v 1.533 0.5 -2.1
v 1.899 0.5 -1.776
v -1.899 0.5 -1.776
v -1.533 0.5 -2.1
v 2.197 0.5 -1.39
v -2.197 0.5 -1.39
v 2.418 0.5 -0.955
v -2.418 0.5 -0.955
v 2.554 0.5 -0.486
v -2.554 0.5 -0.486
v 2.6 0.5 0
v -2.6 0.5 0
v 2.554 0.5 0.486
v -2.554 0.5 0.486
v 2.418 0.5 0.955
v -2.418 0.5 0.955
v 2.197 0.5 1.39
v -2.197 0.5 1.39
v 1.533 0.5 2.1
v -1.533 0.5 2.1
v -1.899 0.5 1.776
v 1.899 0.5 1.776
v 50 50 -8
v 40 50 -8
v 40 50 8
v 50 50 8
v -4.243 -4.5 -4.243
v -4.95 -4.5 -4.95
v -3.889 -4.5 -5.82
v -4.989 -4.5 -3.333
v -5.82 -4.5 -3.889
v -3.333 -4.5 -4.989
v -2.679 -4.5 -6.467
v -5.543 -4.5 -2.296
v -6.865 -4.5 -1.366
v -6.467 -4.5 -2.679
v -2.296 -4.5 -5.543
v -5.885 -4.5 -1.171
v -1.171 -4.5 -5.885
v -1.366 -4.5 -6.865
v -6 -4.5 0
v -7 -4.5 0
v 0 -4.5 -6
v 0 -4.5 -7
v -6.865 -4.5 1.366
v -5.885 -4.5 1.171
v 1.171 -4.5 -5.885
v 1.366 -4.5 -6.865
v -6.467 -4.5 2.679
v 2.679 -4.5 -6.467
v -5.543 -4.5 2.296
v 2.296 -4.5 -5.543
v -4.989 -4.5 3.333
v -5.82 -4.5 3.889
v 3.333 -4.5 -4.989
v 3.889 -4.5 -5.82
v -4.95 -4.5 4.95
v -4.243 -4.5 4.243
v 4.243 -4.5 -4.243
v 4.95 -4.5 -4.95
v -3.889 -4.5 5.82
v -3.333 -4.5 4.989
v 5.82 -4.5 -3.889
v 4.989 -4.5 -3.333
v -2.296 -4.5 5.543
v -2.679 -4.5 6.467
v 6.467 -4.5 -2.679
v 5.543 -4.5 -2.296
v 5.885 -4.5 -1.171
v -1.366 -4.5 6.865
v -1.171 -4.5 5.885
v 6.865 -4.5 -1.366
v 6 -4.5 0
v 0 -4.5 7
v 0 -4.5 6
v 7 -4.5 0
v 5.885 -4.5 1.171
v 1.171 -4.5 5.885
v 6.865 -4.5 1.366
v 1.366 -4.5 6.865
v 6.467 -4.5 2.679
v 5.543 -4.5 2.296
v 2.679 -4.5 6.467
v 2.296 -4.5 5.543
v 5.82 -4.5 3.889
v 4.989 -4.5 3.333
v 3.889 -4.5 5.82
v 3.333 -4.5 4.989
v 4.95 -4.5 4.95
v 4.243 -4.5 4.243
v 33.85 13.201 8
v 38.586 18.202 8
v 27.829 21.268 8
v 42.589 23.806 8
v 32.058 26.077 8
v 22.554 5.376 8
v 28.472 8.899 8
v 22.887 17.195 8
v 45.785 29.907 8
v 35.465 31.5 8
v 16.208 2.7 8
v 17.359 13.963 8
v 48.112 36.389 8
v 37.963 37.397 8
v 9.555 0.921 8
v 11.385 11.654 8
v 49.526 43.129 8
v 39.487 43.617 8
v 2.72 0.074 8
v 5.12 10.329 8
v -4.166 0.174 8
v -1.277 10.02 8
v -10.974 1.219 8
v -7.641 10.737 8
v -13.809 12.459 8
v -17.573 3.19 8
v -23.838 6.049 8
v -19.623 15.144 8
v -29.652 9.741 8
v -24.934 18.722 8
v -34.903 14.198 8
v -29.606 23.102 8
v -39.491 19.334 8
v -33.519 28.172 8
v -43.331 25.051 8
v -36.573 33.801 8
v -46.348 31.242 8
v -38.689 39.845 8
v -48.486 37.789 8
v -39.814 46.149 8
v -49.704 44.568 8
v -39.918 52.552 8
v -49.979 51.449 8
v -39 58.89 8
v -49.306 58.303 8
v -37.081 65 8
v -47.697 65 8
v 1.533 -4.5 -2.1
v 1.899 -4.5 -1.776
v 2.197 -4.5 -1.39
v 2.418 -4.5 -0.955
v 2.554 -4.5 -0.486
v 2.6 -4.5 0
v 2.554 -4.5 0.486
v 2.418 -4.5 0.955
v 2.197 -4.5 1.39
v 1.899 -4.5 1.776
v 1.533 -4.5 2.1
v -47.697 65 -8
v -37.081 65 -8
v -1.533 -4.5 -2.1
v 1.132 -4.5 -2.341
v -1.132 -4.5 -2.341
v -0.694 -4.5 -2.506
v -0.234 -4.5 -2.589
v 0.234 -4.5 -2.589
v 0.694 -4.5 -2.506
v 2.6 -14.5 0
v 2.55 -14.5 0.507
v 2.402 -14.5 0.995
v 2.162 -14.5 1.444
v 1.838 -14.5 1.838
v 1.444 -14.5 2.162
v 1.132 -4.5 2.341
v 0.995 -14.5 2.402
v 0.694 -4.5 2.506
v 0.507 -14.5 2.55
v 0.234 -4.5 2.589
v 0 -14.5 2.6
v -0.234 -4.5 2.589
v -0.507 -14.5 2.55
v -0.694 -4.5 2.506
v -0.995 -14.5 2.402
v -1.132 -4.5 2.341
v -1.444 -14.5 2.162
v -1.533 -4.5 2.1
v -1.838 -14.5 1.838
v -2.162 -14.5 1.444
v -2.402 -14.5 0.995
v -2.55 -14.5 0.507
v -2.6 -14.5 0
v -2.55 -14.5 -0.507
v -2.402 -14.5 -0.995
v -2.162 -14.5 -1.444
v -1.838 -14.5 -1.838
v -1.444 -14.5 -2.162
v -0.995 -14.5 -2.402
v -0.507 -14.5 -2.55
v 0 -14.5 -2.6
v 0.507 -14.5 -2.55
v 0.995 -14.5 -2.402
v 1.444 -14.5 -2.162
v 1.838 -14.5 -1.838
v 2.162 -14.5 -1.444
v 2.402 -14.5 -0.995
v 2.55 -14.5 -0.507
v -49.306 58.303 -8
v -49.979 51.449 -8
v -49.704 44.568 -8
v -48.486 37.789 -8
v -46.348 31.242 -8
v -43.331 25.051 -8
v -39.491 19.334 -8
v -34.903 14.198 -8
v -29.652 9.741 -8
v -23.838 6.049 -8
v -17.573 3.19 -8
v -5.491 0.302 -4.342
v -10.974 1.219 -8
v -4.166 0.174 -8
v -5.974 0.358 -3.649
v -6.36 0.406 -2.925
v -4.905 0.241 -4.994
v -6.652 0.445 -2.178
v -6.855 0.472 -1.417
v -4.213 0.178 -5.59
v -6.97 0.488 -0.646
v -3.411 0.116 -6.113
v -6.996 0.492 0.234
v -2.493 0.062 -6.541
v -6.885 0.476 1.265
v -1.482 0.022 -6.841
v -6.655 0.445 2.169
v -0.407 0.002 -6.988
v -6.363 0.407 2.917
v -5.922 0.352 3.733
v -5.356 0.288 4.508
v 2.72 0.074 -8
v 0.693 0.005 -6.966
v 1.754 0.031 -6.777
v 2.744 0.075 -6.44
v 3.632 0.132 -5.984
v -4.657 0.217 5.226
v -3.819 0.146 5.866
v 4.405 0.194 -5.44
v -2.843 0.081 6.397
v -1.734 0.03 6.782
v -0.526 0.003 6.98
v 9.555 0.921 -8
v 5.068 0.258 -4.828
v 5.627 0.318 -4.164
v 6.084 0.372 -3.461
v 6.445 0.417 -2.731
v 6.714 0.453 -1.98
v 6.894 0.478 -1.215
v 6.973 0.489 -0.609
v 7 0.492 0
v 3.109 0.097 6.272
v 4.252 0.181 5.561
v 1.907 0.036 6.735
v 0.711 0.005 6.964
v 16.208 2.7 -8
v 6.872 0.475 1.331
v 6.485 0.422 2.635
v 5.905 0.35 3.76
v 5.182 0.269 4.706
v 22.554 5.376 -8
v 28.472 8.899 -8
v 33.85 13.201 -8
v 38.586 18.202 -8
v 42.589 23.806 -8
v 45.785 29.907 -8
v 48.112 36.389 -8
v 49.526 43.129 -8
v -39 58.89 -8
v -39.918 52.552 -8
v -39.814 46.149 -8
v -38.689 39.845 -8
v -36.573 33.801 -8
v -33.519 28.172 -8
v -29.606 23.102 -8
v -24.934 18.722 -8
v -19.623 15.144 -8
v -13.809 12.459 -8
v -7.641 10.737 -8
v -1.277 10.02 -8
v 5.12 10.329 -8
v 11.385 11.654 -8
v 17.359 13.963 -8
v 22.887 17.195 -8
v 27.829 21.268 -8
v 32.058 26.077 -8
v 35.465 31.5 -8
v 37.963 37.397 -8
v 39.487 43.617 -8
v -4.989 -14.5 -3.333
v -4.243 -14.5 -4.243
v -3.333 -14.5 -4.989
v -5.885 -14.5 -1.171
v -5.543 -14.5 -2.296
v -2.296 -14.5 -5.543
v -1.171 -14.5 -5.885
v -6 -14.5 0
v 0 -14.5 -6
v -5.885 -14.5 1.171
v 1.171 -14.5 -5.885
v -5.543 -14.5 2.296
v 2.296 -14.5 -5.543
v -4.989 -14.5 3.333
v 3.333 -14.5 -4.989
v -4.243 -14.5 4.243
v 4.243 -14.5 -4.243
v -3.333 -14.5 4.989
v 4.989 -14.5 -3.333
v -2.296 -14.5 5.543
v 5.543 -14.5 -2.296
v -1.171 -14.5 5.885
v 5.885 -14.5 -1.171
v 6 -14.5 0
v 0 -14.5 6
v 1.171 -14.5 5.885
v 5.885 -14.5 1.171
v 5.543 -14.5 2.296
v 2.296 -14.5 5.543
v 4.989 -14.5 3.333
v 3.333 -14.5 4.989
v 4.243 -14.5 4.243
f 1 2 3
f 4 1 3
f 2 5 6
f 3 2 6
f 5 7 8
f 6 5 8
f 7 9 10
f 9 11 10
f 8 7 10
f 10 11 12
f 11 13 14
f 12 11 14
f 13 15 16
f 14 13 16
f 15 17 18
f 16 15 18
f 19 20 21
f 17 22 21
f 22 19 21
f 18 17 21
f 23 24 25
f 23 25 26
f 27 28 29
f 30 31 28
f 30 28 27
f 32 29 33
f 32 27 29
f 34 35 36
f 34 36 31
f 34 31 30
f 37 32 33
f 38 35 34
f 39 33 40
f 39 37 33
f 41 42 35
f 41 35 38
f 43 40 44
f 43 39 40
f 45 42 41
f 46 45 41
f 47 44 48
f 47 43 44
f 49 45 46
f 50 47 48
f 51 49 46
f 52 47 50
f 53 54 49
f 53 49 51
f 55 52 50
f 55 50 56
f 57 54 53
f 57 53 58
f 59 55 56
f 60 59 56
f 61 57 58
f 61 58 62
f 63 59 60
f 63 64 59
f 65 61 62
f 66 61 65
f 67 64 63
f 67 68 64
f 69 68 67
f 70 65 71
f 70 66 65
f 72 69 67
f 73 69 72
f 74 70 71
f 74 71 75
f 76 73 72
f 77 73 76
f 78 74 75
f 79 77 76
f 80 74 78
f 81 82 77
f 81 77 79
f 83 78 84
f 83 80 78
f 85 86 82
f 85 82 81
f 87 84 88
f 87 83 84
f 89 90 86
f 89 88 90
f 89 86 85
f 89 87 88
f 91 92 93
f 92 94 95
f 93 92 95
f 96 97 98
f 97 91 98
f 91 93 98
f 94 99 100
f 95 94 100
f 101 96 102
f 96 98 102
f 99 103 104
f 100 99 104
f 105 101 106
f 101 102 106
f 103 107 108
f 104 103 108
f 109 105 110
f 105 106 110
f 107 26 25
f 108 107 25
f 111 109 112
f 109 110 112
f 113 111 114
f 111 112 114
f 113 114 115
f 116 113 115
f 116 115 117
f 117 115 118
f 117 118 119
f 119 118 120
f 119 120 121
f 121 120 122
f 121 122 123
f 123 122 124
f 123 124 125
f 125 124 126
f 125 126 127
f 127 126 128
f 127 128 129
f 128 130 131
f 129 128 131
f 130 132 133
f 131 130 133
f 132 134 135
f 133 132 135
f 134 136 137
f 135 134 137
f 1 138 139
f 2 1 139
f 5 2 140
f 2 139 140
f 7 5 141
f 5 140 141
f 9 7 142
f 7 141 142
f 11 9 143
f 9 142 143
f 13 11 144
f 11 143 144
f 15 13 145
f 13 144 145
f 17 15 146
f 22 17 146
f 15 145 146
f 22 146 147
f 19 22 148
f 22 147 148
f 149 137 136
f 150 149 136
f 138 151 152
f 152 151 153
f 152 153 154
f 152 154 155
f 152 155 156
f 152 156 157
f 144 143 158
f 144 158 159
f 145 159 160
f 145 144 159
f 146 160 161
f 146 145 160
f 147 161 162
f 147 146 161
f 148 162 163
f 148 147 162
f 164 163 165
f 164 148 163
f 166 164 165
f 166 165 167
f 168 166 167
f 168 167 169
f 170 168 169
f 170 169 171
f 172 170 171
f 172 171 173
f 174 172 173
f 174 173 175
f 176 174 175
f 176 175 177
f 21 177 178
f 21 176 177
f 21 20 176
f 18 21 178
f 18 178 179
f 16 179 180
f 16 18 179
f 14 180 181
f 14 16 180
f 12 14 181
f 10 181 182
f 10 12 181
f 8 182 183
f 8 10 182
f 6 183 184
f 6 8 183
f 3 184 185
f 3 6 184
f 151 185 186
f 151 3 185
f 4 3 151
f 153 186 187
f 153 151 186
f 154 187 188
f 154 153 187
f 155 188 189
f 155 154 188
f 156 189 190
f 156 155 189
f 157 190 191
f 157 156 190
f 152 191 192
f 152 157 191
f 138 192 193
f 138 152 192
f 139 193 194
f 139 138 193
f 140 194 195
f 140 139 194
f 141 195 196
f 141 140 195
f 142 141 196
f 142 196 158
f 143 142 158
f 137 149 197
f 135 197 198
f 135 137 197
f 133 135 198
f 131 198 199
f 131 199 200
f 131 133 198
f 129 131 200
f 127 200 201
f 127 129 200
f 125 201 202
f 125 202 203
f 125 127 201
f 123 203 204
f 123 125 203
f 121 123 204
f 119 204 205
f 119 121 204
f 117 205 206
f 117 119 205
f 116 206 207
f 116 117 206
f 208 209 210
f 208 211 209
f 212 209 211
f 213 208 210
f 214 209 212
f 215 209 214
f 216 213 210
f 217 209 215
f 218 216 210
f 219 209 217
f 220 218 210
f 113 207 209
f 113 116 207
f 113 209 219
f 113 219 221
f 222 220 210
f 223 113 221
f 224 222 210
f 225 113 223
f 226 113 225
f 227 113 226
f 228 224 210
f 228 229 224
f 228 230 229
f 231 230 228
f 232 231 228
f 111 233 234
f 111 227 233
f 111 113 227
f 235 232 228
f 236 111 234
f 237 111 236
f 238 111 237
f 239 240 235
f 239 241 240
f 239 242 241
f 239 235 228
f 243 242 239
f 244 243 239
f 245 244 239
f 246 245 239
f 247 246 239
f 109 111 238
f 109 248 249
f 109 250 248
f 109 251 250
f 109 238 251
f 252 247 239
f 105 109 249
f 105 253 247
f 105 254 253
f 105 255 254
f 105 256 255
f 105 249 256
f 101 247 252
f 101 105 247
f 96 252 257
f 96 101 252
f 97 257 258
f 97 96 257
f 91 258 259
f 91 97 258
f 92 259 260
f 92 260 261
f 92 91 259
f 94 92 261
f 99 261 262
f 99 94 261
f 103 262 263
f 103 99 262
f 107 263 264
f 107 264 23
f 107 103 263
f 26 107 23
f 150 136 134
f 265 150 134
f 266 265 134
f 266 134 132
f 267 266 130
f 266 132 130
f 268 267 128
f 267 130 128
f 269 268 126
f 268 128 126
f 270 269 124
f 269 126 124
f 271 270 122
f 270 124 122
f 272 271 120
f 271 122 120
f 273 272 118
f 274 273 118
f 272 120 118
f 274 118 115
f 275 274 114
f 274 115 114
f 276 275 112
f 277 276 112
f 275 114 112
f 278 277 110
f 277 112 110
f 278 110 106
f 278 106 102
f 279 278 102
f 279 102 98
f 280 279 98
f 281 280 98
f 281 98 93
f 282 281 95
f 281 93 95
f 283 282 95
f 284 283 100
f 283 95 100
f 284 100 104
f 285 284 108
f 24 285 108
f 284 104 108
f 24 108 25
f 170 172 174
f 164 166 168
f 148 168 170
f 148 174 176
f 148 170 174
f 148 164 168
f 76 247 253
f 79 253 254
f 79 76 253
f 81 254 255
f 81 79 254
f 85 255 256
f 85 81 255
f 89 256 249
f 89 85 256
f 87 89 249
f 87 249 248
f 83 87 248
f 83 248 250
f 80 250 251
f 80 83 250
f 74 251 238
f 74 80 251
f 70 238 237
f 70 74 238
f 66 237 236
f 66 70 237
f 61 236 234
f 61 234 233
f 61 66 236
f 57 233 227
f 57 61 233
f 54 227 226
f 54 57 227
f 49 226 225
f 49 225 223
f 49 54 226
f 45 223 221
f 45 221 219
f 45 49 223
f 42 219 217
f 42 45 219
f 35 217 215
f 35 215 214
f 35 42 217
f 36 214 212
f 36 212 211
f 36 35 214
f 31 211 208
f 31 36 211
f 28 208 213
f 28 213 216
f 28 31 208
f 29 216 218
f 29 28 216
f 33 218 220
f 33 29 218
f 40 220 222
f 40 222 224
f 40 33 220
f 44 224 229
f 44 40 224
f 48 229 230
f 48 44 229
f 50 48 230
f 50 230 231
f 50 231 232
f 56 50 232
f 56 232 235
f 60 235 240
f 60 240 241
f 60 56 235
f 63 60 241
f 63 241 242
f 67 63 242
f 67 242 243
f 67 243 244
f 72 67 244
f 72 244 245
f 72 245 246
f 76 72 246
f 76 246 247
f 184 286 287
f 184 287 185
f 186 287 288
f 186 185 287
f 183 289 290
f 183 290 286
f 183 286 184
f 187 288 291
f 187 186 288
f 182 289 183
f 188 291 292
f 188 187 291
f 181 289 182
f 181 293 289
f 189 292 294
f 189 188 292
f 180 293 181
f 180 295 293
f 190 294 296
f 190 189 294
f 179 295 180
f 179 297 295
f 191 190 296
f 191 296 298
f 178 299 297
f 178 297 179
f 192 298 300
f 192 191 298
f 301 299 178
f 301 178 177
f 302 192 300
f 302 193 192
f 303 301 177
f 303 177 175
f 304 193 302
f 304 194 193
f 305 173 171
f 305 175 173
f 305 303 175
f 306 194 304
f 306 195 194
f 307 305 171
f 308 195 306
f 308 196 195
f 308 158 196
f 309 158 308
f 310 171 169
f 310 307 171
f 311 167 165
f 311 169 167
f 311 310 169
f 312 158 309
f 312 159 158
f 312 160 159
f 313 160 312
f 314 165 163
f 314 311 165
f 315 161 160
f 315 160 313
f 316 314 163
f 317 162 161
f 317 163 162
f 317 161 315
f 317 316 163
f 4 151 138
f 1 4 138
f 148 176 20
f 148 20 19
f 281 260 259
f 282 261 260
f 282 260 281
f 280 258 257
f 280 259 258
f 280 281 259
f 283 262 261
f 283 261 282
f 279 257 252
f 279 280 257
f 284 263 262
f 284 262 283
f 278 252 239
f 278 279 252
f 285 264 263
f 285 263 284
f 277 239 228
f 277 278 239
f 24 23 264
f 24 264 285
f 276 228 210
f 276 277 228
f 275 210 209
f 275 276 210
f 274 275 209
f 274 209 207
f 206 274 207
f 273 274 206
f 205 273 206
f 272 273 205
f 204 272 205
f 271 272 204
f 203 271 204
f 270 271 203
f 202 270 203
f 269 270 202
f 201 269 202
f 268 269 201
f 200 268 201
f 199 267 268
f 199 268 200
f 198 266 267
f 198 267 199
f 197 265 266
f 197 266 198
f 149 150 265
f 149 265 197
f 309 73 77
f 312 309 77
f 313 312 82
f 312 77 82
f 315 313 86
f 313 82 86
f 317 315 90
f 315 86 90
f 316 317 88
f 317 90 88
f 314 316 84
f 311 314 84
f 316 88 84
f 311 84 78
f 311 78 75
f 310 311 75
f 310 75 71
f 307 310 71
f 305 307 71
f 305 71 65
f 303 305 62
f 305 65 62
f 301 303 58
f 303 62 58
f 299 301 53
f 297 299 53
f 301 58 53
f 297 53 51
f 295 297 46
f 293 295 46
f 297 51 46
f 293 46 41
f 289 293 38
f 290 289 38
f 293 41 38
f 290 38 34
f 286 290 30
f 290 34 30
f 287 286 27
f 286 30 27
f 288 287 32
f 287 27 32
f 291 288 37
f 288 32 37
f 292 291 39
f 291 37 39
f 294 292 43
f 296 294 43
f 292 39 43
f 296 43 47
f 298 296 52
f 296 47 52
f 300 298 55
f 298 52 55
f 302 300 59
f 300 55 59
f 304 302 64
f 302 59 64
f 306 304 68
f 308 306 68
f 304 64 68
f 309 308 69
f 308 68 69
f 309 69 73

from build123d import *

# Parameters (mm, degrees)
PAD_DEPTH     = 8
SKETCH002_R   = 7
PAD001_DEPTH  = 4.5
POCKET_DEPTH  = 5
SKETCH005_R   = 6
SKETCH005_R_2 = 2.6
PAD002_DEPTH  = 10


with BuildPart() as part:
    # Sketch001 → Pad (new body, symmetric)
    with BuildSketch(Plane.XY):
        with BuildLine():
            ThreePointArc((-37.080992, 65), (-7.64069, 10.736533), (40, 50))
            Line((40, 50), (50, 50))
            ThreePointArc((-47.69696, 65), (-7.587885, 0.579114), (50, 50))
            Line((-47.69696, 65), (-37.080992, 65))
        make_face()
    extrude(amount=PAD_DEPTH, both=True)

    # Sketch002 → Pad001 (join, symmetric)
    with BuildSketch(Plane.XZ):
        Circle(SKETCH002_R)
    extrude(amount=PAD001_DEPTH, both=True)

    # Sketch004 (on Face8 of Pad001) → Pocket (cut)
    with BuildSketch(Plane.XZ.offset(4.5)):
        with BuildLine():
            Line((-1.532971, 2.1), (1.532971, 2.1))
            ThreePointArc((1.532971, -2.1), (2.6, 0), (1.532971, 2.1))
            Line((-1.532971, -2.1), (1.532971, -2.1))
            ThreePointArc((-1.532971, 2.1), (-2.6, 0), (-1.532971, -2.1))
        make_face()
    extrude(amount=-POCKET_DEPTH, mode=Mode.SUBTRACT)

    # Sketch005 (on Face8 of Pocket) → Pad002 (join)
    with BuildSketch(Plane.XZ.offset(4.5)):
        Circle(SKETCH005_R)
        Circle(SKETCH005_R_2, mode=Mode.SUBTRACT)
    extrude(amount=PAD002_DEPTH)


solid = part.part
